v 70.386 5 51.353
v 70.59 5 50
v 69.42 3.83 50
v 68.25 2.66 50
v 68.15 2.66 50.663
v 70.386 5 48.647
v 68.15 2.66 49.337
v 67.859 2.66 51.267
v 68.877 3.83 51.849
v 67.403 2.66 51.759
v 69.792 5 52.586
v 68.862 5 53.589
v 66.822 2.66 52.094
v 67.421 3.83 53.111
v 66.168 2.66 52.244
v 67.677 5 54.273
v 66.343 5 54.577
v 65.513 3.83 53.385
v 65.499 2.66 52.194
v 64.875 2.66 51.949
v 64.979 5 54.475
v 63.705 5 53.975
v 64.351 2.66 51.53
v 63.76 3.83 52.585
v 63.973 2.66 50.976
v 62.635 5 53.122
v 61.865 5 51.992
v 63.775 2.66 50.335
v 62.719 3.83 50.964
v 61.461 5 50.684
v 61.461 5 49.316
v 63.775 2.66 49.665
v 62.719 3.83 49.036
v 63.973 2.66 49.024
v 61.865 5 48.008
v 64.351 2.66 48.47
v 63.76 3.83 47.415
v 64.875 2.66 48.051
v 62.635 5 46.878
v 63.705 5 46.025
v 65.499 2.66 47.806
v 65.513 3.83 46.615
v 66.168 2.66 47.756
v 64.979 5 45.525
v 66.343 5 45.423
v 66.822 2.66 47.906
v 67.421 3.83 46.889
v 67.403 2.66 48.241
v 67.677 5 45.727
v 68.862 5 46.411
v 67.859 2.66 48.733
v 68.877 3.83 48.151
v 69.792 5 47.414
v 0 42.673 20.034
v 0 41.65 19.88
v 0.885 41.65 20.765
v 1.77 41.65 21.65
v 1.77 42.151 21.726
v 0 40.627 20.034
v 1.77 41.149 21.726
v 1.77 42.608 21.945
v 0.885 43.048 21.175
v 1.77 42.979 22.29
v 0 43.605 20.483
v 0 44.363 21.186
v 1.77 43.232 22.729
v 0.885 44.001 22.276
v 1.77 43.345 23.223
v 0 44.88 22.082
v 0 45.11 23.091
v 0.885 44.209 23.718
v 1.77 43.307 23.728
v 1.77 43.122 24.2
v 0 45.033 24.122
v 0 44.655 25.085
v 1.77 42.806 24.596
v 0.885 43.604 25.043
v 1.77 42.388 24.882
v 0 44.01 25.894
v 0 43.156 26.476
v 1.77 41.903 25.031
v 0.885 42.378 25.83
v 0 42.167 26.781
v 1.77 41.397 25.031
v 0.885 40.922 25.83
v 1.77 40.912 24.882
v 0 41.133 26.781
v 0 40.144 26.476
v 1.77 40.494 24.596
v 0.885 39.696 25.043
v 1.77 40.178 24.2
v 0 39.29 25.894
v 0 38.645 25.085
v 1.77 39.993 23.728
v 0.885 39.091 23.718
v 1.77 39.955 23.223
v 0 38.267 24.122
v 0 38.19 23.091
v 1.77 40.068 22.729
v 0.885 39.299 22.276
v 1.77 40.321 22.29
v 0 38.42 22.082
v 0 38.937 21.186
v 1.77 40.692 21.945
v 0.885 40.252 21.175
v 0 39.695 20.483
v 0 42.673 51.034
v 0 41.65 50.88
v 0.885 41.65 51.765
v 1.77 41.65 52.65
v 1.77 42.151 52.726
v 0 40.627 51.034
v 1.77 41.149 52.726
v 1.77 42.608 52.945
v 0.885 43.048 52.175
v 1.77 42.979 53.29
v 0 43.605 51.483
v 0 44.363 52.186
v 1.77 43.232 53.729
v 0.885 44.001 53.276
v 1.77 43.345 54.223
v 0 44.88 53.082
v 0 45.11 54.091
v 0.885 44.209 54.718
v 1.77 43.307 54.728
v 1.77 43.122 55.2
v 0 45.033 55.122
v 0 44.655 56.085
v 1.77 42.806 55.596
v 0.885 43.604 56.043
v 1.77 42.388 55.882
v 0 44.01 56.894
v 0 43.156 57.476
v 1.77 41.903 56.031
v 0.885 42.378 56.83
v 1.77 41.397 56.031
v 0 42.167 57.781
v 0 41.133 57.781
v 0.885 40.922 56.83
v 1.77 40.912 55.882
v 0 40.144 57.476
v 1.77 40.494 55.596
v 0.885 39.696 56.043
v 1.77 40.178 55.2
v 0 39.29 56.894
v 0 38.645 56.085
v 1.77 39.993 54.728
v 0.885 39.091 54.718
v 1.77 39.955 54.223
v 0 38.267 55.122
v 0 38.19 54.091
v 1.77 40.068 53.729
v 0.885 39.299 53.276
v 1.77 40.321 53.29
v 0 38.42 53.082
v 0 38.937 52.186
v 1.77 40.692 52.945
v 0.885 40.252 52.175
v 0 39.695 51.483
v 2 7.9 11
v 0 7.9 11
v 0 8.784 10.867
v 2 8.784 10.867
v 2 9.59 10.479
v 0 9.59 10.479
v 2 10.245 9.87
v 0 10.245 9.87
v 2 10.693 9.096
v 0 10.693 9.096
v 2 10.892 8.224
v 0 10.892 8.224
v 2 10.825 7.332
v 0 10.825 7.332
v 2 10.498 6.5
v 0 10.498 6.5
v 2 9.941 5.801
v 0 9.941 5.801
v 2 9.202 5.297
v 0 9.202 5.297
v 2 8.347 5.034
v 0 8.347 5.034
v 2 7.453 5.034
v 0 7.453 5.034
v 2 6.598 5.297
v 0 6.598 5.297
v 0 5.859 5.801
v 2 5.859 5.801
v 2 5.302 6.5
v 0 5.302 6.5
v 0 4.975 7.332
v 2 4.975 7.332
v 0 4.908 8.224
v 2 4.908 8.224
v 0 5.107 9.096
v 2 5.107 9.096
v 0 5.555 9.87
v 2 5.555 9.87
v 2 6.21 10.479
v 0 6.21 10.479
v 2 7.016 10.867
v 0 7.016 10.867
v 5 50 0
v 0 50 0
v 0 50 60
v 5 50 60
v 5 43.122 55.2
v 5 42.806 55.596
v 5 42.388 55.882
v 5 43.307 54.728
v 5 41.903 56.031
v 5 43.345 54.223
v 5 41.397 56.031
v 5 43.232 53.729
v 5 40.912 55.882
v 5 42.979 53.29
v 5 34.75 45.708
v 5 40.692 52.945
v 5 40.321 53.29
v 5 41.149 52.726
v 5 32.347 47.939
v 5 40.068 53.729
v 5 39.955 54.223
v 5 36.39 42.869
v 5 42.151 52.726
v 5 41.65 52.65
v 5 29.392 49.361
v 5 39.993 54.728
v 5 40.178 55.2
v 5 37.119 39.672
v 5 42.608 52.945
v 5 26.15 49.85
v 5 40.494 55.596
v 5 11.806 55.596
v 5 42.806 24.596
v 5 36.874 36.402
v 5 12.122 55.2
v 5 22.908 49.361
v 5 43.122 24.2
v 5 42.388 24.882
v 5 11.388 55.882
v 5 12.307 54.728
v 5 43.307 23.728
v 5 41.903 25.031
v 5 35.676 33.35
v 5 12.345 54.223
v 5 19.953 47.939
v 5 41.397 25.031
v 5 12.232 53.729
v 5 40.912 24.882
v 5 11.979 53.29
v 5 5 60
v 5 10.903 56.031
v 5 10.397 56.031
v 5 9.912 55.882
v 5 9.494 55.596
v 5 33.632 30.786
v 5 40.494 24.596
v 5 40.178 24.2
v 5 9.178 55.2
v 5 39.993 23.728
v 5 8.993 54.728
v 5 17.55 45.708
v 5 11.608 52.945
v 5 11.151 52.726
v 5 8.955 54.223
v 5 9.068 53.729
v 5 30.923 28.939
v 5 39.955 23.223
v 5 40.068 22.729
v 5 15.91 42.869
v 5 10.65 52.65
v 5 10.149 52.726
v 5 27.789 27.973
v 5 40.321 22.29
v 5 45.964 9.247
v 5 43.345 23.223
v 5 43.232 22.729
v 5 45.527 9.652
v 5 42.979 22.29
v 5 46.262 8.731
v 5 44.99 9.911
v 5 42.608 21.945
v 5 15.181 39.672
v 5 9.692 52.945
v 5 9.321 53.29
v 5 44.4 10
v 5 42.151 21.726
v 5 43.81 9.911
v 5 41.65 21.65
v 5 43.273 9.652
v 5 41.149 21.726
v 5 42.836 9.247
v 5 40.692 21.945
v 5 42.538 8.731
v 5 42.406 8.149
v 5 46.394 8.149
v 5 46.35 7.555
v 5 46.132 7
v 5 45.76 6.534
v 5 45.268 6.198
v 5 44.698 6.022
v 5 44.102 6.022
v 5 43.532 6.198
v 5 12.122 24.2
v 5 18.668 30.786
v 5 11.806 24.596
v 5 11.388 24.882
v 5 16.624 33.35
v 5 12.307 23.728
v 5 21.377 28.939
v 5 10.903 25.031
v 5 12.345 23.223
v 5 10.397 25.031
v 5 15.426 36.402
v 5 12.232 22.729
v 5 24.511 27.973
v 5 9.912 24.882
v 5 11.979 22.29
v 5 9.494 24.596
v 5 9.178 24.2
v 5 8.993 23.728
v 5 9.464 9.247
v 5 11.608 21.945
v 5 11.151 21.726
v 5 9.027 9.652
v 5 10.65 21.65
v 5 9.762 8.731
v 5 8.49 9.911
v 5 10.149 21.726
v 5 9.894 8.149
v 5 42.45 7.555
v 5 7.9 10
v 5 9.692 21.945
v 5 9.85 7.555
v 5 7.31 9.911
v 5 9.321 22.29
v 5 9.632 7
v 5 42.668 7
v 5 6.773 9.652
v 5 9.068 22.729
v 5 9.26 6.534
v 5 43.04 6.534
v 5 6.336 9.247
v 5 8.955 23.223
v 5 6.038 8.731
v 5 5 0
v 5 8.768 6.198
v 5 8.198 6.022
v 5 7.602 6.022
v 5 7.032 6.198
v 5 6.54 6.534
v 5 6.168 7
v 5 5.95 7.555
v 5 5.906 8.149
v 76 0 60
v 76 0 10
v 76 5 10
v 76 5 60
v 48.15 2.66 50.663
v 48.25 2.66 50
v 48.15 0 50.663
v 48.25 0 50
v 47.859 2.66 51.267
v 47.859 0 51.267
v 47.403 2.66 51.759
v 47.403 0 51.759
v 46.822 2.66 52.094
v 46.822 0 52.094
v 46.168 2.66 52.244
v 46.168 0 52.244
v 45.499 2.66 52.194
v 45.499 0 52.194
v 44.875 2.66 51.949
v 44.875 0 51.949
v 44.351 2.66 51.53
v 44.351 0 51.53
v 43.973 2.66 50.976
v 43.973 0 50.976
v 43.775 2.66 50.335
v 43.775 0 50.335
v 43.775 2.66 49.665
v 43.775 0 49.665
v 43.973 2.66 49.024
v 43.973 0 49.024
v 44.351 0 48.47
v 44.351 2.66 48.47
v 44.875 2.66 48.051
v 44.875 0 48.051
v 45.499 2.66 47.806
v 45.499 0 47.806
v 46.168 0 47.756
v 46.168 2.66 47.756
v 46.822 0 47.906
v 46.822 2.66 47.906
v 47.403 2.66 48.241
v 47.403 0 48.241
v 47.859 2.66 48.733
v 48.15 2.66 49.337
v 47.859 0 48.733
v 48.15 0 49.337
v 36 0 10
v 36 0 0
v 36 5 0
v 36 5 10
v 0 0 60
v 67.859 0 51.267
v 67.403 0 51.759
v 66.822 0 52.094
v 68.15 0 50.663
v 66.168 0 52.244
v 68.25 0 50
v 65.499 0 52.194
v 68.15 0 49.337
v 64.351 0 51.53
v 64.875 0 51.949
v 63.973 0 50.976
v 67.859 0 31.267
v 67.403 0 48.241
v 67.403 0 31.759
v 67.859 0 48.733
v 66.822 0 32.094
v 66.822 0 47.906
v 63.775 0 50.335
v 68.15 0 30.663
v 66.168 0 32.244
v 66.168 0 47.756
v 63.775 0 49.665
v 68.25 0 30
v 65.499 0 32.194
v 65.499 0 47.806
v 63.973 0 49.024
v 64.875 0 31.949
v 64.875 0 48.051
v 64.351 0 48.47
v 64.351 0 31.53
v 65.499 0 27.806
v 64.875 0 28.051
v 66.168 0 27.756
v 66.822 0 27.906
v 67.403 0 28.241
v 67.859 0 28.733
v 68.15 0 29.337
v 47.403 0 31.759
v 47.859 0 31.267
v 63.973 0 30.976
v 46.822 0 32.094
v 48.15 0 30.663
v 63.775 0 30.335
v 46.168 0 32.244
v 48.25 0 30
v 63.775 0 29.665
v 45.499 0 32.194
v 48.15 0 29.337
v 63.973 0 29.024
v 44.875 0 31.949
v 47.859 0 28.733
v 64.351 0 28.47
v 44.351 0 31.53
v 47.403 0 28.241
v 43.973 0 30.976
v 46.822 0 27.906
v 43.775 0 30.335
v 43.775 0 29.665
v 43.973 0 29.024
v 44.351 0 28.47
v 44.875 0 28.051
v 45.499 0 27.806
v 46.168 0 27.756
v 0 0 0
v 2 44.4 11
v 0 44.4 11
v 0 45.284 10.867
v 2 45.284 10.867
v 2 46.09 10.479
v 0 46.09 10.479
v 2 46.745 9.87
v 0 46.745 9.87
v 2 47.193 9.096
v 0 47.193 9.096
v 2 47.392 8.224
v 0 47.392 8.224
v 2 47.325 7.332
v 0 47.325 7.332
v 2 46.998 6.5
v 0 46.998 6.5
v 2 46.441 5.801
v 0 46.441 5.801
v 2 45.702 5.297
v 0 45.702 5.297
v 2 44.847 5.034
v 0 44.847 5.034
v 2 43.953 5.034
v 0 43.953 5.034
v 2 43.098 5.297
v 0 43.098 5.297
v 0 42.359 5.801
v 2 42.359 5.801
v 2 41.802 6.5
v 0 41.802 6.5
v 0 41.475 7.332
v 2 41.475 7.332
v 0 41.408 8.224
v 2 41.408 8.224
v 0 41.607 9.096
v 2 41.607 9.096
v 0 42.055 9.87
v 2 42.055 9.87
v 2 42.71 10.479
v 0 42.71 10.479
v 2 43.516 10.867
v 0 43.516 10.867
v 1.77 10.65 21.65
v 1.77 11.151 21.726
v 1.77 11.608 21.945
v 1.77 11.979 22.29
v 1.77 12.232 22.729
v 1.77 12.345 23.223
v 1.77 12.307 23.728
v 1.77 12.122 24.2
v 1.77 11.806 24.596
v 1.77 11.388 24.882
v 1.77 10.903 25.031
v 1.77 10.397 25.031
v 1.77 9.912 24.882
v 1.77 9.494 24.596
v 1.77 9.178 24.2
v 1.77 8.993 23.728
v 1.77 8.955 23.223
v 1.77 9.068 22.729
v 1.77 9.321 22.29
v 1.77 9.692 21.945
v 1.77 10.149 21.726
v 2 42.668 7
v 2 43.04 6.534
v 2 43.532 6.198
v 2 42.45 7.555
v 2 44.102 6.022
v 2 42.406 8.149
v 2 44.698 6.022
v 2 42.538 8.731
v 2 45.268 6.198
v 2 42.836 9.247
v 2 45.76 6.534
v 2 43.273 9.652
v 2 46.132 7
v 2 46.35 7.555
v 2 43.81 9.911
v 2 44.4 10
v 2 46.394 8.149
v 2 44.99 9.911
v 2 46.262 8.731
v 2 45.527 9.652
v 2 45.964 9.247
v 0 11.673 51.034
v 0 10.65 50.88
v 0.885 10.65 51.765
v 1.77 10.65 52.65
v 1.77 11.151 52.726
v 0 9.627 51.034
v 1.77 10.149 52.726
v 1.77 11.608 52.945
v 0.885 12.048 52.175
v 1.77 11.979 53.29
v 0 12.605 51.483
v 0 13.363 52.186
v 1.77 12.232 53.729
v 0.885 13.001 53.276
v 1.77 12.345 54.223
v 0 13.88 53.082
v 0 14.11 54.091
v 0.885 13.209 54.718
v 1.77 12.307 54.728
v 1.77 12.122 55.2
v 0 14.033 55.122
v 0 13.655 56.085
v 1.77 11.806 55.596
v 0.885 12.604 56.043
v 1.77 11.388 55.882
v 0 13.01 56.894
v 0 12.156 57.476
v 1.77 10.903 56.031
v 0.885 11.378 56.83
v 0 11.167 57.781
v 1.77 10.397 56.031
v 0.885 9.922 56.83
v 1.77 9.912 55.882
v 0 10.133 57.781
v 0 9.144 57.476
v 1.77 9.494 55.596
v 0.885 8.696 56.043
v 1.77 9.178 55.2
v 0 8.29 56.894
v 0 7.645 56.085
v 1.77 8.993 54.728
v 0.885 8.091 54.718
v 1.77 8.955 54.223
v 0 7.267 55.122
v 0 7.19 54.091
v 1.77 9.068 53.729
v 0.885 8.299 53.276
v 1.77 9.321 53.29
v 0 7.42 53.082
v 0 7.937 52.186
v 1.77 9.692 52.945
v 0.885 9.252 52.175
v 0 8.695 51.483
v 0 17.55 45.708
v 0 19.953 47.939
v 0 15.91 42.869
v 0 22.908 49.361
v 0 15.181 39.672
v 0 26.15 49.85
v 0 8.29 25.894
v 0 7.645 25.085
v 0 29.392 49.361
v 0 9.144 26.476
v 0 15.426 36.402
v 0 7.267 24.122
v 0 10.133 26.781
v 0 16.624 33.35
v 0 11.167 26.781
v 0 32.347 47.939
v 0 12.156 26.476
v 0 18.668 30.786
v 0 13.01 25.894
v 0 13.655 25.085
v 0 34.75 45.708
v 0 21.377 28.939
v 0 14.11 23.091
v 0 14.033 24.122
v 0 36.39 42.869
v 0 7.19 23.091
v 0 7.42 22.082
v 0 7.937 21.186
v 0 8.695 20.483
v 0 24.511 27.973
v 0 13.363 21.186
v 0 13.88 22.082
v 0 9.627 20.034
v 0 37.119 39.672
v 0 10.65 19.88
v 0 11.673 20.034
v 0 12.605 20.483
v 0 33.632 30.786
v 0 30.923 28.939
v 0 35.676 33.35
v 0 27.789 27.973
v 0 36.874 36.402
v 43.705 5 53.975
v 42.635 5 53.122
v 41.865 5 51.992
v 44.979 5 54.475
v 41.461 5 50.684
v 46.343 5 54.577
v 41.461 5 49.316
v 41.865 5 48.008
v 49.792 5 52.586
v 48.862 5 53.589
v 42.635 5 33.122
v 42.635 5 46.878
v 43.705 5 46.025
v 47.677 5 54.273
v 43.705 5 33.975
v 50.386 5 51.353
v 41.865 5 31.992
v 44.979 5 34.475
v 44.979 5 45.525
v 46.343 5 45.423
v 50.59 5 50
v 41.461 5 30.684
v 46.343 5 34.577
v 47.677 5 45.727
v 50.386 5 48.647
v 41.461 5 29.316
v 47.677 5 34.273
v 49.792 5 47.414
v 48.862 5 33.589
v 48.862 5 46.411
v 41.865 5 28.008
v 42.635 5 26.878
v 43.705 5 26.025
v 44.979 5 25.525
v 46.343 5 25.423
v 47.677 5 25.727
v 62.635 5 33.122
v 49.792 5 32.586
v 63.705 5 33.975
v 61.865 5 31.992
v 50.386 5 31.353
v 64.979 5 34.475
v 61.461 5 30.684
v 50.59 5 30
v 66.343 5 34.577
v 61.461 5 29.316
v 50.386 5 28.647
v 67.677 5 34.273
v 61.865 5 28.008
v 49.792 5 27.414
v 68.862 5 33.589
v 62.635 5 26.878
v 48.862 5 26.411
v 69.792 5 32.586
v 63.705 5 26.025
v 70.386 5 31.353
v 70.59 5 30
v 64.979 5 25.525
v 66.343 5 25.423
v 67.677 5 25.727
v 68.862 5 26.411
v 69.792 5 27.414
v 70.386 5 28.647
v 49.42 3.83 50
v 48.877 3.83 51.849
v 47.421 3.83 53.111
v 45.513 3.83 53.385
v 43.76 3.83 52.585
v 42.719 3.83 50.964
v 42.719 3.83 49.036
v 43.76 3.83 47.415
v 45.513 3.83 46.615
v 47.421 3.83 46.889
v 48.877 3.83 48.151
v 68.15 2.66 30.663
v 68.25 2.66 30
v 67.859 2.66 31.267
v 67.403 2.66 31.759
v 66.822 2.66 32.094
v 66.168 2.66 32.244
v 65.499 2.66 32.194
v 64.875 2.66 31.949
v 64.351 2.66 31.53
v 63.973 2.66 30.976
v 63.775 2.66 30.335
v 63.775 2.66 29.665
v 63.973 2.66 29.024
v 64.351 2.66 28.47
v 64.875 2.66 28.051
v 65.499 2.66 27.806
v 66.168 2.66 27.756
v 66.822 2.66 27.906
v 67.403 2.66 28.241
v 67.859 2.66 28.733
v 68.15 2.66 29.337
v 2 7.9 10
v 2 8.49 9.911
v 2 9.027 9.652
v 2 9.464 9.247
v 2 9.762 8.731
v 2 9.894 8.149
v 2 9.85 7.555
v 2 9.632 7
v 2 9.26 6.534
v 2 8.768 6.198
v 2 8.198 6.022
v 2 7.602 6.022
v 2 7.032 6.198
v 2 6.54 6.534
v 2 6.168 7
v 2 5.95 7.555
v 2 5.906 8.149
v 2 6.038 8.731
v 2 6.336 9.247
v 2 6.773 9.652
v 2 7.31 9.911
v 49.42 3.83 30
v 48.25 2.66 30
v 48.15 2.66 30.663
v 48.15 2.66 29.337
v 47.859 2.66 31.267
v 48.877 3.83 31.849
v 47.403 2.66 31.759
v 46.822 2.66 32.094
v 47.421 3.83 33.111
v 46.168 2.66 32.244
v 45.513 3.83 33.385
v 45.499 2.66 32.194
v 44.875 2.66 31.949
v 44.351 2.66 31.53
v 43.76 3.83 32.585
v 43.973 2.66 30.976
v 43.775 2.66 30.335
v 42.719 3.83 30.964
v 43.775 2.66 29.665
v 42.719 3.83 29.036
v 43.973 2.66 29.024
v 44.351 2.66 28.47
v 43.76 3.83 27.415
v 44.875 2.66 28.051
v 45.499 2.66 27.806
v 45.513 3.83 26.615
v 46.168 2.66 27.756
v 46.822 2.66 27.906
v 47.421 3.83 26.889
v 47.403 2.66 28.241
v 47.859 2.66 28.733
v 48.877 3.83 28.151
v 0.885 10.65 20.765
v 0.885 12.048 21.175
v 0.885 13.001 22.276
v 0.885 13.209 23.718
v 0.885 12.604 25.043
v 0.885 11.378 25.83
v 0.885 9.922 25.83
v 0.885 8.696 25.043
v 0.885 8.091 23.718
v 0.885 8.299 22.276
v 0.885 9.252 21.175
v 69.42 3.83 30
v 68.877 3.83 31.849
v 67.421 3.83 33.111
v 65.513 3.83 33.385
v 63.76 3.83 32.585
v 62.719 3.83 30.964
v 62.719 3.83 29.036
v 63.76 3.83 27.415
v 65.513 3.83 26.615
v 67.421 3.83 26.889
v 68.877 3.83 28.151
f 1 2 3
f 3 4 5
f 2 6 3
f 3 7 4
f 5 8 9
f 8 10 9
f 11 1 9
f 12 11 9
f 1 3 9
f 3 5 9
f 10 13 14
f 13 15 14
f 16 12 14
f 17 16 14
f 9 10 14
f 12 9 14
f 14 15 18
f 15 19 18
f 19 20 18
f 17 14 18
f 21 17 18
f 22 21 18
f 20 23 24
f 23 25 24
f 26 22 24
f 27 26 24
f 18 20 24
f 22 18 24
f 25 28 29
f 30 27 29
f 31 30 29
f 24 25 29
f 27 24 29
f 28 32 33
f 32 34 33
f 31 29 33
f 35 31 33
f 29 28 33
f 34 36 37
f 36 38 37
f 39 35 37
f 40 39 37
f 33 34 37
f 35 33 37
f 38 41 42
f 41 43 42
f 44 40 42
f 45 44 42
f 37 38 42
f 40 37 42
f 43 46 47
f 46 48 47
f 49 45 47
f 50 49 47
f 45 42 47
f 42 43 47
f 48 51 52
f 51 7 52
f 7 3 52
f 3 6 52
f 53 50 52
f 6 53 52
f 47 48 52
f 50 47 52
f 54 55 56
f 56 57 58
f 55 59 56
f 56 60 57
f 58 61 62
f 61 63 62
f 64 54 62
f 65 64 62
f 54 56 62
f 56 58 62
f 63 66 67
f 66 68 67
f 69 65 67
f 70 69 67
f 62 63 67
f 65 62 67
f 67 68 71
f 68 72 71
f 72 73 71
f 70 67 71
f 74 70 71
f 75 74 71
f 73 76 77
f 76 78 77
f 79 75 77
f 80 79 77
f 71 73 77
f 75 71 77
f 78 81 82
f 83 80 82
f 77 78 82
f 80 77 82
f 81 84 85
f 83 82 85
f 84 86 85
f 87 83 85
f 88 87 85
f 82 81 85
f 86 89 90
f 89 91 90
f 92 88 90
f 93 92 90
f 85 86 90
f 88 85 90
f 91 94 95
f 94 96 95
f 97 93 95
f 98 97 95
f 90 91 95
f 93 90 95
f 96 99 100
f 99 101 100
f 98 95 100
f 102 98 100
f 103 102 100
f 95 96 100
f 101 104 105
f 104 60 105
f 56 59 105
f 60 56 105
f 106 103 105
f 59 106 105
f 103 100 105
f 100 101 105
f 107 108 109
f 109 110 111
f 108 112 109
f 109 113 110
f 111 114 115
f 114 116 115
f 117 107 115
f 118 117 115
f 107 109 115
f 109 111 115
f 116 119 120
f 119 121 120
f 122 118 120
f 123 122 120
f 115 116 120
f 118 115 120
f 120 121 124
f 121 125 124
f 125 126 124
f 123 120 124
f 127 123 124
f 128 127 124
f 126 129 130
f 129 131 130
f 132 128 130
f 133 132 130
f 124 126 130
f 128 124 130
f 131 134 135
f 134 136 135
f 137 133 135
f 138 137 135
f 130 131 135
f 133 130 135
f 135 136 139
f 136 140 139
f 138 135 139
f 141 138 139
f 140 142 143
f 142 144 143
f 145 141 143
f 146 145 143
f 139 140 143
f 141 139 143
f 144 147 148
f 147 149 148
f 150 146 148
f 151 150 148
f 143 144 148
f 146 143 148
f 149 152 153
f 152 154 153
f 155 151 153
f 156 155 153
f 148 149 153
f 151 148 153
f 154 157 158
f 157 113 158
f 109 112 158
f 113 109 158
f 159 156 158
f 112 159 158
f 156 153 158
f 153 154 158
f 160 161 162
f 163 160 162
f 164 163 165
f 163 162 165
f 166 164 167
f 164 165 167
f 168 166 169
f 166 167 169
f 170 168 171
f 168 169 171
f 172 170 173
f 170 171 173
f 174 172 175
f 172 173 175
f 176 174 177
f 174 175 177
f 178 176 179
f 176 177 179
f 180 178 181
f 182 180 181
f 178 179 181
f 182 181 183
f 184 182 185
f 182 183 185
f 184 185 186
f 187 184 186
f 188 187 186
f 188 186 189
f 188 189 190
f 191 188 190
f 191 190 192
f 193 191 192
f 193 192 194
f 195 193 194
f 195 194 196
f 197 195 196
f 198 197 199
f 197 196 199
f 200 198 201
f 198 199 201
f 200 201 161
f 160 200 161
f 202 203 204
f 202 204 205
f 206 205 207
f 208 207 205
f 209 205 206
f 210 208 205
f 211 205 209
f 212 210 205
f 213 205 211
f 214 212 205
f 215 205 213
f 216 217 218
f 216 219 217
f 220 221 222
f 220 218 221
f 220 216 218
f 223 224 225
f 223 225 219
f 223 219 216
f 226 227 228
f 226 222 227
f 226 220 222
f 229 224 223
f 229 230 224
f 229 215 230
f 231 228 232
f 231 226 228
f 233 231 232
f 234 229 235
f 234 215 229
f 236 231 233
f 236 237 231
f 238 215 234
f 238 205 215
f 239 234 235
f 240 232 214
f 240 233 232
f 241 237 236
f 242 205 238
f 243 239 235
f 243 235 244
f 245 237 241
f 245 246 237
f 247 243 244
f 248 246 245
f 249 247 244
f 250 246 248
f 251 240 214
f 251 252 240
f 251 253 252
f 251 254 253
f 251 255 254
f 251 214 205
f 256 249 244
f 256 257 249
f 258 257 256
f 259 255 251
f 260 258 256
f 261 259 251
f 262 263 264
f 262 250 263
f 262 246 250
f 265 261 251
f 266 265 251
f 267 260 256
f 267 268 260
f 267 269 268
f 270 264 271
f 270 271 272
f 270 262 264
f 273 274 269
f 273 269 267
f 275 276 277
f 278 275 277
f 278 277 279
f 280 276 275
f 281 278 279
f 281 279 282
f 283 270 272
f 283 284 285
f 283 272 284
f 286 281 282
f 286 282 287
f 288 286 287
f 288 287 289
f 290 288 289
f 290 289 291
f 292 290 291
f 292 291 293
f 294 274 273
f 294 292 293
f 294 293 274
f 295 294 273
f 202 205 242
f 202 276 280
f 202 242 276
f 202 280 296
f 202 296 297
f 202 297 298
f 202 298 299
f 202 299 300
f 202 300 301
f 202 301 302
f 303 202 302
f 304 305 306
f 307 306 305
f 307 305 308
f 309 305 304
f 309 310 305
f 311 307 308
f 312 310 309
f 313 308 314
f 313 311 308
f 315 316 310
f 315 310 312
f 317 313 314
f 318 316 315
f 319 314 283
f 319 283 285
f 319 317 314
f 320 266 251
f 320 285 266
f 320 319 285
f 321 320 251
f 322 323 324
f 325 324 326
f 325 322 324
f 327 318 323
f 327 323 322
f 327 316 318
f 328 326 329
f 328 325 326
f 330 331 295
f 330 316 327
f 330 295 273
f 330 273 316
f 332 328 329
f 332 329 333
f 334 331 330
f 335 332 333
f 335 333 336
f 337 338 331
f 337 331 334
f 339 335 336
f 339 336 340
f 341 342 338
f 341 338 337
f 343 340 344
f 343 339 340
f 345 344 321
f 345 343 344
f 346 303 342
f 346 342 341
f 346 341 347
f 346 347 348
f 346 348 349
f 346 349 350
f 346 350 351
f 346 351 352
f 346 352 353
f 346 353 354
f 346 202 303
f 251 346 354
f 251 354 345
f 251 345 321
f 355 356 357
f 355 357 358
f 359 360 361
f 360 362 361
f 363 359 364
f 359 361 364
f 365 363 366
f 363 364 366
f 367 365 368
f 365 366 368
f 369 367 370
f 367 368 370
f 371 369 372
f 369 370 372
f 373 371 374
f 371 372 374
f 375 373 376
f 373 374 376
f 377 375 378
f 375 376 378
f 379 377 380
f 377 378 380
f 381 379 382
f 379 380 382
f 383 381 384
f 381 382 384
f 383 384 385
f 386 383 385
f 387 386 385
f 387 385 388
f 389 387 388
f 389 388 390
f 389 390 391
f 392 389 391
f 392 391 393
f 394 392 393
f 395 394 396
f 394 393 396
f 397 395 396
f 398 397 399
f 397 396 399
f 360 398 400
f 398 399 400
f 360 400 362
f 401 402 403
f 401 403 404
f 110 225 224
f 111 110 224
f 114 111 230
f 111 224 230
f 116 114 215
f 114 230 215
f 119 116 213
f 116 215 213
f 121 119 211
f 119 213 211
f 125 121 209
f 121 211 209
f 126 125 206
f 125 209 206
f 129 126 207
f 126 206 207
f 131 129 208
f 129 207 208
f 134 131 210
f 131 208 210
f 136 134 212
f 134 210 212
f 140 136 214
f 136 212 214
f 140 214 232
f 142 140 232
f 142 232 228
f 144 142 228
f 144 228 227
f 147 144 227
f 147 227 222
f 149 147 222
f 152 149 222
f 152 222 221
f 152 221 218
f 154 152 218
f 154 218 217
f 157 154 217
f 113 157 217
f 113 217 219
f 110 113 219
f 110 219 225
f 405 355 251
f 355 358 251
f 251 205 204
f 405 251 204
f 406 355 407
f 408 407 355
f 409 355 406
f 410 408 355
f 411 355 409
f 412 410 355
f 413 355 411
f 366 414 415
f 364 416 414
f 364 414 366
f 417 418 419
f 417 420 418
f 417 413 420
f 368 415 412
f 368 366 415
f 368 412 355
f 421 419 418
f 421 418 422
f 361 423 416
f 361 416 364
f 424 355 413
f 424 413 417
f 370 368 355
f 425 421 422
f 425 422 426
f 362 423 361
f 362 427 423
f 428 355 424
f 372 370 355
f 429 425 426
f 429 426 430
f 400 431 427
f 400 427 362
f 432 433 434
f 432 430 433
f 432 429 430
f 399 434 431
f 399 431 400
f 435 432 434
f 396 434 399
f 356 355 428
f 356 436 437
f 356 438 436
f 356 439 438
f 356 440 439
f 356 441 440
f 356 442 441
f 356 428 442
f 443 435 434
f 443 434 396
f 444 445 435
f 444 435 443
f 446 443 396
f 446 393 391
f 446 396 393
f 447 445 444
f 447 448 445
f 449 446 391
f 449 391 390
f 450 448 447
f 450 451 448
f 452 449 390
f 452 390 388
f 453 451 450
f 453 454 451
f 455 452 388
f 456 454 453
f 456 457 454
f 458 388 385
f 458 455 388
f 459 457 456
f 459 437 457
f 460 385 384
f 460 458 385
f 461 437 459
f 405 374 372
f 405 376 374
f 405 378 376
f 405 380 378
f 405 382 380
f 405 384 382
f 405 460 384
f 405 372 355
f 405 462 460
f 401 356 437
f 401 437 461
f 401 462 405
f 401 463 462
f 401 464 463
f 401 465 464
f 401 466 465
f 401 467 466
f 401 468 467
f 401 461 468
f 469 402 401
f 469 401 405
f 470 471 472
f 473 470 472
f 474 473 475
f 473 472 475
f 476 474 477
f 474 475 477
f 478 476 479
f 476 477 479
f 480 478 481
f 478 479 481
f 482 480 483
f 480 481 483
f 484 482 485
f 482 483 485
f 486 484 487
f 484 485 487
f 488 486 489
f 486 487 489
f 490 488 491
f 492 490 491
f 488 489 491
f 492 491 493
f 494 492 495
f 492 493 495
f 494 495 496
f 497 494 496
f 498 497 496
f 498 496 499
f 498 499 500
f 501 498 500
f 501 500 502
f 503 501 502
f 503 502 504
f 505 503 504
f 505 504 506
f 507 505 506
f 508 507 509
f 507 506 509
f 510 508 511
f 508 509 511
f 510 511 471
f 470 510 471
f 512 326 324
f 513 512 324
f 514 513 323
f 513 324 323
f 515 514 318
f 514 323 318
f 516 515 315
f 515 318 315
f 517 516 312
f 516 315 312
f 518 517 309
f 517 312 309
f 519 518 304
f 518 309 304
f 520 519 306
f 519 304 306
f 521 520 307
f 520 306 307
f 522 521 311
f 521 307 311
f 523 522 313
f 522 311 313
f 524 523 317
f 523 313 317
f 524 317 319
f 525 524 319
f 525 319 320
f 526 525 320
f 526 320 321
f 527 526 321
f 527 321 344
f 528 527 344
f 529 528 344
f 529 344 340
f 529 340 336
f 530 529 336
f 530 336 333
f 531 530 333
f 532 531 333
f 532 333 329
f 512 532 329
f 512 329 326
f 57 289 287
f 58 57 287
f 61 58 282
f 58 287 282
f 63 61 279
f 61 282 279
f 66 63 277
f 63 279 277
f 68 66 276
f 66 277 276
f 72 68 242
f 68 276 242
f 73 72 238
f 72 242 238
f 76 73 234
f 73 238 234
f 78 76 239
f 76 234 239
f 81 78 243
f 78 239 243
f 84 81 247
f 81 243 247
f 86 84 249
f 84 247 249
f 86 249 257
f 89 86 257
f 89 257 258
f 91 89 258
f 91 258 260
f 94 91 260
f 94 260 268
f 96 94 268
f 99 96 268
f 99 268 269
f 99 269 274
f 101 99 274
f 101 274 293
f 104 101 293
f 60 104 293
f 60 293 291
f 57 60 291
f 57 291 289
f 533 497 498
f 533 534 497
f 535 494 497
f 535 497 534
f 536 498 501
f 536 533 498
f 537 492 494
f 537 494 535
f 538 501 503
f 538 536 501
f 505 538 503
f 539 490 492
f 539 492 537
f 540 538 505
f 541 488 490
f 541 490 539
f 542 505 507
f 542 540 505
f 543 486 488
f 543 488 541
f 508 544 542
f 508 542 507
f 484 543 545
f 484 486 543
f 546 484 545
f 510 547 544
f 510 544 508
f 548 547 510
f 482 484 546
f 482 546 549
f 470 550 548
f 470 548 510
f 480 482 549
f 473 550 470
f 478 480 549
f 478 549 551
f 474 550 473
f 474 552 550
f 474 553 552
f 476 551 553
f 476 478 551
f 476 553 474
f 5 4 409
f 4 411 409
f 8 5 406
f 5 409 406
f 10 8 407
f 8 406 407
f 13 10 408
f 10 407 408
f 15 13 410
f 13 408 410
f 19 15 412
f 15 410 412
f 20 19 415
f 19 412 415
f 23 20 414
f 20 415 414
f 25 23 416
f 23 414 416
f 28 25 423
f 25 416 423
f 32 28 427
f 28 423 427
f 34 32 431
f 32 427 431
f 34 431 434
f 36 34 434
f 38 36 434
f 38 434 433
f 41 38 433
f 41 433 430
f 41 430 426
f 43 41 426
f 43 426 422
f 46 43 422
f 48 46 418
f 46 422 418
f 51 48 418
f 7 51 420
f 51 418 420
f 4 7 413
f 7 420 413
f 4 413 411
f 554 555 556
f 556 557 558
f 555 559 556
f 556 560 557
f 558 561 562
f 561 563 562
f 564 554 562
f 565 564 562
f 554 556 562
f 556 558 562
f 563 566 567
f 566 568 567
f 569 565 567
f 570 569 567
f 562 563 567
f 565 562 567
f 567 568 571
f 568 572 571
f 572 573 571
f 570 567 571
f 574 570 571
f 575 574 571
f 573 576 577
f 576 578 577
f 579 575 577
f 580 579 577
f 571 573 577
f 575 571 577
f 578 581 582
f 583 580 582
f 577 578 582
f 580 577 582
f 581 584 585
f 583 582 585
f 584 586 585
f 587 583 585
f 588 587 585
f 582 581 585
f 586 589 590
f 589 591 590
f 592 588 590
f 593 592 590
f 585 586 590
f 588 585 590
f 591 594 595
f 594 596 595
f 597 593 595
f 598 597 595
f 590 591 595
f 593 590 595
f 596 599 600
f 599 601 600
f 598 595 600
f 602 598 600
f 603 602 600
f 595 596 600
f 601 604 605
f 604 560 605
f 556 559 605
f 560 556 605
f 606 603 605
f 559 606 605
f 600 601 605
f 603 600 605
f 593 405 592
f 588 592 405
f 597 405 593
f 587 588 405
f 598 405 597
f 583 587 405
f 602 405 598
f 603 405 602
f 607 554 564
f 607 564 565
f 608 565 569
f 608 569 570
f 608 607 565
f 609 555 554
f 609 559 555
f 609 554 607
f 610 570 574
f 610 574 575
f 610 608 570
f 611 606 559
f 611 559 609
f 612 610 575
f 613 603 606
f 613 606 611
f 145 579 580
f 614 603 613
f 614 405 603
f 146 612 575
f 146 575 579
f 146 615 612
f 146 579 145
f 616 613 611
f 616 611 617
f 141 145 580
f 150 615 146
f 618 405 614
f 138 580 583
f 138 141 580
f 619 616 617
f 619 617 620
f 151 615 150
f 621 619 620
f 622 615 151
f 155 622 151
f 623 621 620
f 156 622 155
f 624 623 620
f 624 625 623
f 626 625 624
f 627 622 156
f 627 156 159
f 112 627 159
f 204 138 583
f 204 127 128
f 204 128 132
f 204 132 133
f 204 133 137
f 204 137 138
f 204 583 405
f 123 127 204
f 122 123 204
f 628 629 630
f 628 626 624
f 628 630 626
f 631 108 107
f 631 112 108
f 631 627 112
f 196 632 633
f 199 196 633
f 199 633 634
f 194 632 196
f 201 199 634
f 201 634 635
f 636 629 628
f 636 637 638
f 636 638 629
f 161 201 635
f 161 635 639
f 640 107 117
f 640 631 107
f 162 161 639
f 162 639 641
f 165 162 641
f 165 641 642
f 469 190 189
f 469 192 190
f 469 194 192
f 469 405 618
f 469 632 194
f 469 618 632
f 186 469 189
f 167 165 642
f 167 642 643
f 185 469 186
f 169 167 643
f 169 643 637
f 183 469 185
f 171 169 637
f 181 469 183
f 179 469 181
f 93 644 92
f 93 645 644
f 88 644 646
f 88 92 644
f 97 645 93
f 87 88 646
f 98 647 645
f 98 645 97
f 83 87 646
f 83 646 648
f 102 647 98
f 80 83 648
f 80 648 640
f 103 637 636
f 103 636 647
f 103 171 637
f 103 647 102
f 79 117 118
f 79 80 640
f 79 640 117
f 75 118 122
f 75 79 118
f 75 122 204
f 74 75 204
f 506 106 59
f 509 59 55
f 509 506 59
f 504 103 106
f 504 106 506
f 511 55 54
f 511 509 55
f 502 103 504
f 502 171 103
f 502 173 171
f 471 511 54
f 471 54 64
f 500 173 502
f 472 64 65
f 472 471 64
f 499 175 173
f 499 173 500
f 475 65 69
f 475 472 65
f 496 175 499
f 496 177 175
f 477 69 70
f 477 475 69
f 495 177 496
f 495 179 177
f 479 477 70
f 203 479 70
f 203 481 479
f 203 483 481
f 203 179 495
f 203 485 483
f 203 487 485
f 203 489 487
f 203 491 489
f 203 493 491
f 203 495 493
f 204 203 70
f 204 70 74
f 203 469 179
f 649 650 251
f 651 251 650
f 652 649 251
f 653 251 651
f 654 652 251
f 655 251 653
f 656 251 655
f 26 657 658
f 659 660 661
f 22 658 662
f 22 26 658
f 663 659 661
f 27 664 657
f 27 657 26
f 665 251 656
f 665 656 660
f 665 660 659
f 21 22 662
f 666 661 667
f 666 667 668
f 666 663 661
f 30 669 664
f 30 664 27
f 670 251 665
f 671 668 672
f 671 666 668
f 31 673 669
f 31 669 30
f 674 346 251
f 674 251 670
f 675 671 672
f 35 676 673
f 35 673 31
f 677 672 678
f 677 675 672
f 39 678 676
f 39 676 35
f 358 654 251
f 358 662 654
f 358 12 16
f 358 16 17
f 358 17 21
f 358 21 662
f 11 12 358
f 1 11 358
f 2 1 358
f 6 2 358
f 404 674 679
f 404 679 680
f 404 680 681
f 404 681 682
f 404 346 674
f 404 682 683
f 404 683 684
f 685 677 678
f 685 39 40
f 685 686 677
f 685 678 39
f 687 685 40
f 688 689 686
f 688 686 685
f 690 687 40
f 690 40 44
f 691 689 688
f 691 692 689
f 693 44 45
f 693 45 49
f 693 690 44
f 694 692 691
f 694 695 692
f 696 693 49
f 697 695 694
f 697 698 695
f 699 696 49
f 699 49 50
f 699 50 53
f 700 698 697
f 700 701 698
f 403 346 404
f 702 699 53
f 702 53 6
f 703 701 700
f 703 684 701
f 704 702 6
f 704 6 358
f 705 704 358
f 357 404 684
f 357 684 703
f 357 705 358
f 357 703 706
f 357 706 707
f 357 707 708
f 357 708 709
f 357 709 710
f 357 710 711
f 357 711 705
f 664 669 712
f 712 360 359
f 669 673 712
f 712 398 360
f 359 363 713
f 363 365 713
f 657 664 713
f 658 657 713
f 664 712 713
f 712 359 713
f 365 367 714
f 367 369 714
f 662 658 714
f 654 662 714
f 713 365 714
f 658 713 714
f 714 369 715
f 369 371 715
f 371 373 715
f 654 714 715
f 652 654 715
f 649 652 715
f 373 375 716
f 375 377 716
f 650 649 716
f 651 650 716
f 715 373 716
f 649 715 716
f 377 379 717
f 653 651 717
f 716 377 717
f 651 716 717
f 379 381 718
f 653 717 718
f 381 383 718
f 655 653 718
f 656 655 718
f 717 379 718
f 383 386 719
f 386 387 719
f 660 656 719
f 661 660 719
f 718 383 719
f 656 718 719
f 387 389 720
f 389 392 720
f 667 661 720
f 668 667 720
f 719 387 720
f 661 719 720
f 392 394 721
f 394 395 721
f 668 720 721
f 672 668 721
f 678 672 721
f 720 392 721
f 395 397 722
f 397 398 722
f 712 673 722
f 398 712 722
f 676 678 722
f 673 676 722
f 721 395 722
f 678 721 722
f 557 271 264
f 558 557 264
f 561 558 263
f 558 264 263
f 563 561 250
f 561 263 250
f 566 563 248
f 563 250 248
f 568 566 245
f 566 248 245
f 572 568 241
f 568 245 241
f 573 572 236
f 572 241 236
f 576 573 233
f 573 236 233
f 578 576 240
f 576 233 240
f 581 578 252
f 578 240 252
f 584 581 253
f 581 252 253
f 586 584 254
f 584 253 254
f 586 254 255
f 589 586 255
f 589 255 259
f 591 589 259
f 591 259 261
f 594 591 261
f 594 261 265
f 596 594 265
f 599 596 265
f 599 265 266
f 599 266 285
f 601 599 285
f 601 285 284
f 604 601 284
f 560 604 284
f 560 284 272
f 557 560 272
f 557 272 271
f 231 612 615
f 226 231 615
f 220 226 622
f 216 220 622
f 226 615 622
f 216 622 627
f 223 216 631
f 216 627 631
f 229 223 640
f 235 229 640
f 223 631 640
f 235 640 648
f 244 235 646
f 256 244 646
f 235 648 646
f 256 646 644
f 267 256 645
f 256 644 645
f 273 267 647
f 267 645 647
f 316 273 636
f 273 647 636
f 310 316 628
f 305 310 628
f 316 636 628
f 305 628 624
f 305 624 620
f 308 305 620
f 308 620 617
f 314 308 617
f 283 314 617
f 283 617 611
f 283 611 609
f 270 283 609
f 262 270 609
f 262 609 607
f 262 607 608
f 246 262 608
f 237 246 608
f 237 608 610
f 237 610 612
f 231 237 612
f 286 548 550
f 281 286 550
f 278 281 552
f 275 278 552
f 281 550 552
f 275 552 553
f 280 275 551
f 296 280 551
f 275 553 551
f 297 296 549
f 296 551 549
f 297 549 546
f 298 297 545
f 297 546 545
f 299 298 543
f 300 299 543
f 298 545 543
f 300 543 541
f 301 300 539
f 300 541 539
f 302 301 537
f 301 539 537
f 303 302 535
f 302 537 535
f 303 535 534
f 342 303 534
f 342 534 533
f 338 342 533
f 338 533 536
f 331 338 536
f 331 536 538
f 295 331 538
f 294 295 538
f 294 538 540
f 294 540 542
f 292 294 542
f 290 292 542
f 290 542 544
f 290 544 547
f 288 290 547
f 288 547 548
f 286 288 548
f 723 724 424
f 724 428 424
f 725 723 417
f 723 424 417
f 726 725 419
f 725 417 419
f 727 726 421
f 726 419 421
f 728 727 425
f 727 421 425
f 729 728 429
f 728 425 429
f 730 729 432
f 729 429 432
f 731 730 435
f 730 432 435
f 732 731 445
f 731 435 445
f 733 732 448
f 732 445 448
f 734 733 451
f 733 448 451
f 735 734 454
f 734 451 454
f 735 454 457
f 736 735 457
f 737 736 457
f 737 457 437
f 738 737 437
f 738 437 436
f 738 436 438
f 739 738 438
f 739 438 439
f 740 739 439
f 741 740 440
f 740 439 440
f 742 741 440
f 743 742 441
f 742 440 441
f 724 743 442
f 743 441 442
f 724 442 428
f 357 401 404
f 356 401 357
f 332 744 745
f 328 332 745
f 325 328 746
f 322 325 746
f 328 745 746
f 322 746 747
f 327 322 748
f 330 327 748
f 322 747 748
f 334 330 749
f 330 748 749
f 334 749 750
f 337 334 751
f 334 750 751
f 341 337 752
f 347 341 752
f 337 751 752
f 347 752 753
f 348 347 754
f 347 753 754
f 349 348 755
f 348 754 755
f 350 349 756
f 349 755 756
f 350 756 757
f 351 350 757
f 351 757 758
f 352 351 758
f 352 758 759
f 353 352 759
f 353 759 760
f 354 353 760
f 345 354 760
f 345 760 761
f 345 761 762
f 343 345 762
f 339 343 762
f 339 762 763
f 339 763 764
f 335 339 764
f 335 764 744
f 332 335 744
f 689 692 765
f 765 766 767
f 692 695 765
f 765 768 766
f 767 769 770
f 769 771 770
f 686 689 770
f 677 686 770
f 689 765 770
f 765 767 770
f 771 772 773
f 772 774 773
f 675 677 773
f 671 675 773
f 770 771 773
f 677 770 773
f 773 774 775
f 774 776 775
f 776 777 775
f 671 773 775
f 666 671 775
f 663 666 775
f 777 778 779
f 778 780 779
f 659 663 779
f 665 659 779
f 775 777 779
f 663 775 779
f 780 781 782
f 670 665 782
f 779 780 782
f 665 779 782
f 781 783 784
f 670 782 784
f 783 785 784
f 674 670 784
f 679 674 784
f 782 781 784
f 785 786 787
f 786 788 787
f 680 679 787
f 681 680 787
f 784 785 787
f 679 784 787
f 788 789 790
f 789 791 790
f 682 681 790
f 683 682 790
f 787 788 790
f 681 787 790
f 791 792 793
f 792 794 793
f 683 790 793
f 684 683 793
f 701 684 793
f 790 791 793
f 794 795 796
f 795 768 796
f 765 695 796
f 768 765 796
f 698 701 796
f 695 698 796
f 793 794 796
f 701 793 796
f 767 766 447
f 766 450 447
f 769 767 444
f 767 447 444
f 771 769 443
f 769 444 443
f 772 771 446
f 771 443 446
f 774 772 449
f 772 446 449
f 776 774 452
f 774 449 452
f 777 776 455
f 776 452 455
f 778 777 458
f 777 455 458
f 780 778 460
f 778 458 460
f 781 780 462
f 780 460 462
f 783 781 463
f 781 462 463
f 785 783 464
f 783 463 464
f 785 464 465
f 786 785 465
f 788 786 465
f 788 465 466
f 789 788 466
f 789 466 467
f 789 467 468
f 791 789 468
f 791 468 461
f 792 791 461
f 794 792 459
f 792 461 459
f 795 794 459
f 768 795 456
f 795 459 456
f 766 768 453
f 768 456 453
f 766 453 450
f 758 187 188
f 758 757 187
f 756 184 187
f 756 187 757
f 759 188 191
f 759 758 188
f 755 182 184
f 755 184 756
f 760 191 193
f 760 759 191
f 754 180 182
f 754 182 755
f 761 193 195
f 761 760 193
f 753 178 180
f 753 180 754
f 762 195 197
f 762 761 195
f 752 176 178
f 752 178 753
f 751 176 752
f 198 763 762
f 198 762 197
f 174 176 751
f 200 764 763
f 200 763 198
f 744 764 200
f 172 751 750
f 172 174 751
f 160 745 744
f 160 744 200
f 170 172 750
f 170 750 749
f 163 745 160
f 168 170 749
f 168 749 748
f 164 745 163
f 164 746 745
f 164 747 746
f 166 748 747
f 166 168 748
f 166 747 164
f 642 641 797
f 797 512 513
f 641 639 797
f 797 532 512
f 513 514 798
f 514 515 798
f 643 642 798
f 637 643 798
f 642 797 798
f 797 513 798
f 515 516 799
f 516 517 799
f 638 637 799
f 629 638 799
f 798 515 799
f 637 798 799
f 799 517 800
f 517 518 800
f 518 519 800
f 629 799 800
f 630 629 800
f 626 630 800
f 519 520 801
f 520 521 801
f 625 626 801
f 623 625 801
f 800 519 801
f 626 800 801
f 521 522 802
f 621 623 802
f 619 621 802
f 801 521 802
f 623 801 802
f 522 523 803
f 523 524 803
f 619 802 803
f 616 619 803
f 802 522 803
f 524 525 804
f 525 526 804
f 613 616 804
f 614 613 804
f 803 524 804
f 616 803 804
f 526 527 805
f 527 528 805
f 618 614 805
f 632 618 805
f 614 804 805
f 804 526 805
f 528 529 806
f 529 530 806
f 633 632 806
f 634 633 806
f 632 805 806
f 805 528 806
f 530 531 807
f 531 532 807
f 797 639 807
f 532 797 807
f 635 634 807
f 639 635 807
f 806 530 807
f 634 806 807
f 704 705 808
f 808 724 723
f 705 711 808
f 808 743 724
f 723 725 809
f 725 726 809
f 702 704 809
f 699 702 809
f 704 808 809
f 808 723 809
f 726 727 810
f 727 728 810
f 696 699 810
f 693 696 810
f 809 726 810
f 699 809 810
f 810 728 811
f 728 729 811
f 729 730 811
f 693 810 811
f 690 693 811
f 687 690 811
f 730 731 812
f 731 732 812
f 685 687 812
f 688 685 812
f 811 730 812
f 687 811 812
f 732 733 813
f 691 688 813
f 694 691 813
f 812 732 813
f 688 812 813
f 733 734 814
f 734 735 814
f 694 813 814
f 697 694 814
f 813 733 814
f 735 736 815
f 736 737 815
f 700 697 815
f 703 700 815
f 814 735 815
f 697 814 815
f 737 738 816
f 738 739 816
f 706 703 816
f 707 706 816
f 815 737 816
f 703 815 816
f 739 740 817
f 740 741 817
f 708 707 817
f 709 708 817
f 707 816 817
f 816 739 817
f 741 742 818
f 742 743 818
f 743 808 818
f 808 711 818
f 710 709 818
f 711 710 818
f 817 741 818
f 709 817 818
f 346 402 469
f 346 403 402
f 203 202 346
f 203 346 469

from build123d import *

# Parameters (mm, degrees)
EXTRUDE_1_DEPTH             = 60
SKETCH_2_R                  = 11
CUT_EXTRUDE_1_DEPTH         = 60
CSK_1_D                     = 3.4
CSK_1_DEPTH                 = 5
CSK_1_CSINK_D               = 6.94
CSK_1_CSINK_ANGLE           = 90
SKETCH_5_W                  = 64
SKETCH_5_H                  = 10
CUT_EXTRUDE_2_DEPTH         = 127.885775404
SKETCH_6_R                  = 2
CUT_EXTRUDE_3_DEPTH         = 10
SKETCH_7_R                  = 3
CUT_EXTRUDE_4_DEPTH         = 2
SKETCH_8_W                  = 24
SKETCH_8_H                  = 50
CUT_EXTRUDE_5_DEPTH         = 127.885775404
HOLE_WIZARD_M41_D           = 4.5
HOLE_WIZARD_M41_CSINK_D     = 9.18
HOLE_WIZARD_M41_CSINK_ANGLE = 90


with BuildPart() as part:
    # Эскиз1 → Бобышка-Вытянуть1 (new body)
    with BuildSketch(Plane.XY):
        Polygon((0, 0), (0, 50), (5, 50), (5, 5), (95, 5), (95, 50), (100, 50), (100, 0), align=None)
    extrude(amount=EXTRUDE_1_DEPTH)

    # Эскиз2 → Вырез-Вытянуть1 (cut)
    with BuildSketch(Plane.ZY):
        with Locations((38.85, 26.15)):
            Circle(SKETCH_2_R)
    extrude(amount=-CUT_EXTRUDE_1_DEPTH, mode=Mode.SUBTRACT)

    # CSK размера винта с полупотайной головкой и крестообразным шлицем1
    with Locations(Plane.ZY):
        with Locations((54.35, 10.65), (54.35, 41.65), (23.35, 41.65), (23.35, 10.65)):
            CounterSinkHole(CSK_1_D / 2, CSK_1_CSINK_D / 2, depth=CSK_1_DEPTH, counter_sink_angle=CSK_1_CSINK_ANGLE)

    # Эскиз5 → Вырез-Вытянуть2 (cut, through all)
    with BuildSketch(Plane.XZ):
        with Locations((68, 5)):
            Rectangle(SKETCH_5_W, SKETCH_5_H)
    extrude(amount=-CUT_EXTRUDE_2_DEPTH, mode=Mode.SUBTRACT)

    # Эскиз6 → Вырез-Вытянуть3 (cut)
    with BuildSketch(Plane.ZY):
        with Locations((8, 44.4)):
            Circle(SKETCH_6_R)
        with Locations((8, 7.9)):
            Circle(SKETCH_6_R)
    extrude(amount=-CUT_EXTRUDE_3_DEPTH, mode=Mode.SUBTRACT)

    # Эскиз7 → Вырез-Вытянуть4 (cut)
    with BuildSketch(Plane.ZY):
        with Locations((8, 44.4)):
            Circle(SKETCH_7_R)
        with Locations((8, 7.9)):
            Circle(SKETCH_7_R)
    extrude(amount=-CUT_EXTRUDE_4_DEPTH, mode=Mode.SUBTRACT)

    # Эскиз8 → Вырез-Вытянуть5 (cut, through all)
    with BuildSketch(Plane.XZ):
        with Locations((88, 35)):
            Rectangle(SKETCH_8_W, SKETCH_8_H)
    extrude(amount=-CUT_EXTRUDE_5_DEPTH, mode=Mode.SUBTRACT)

    # Зенковка для винта с потайной головкой и внутренним шестигранником M41 (through all)
    with Locations(Plane(origin=(0, 5, 0), x_dir=(-1, 0, 0), z_dir=(0, 1, 0))):
        with Locations((-46, 30), (-66, 30), (-46, 50), (-66, 50)):
            CounterSinkHole(HOLE_WIZARD_M41_D / 2, HOLE_WIZARD_M41_CSINK_D / 2, counter_sink_angle=HOLE_WIZARD_M41_CSINK_ANGLE)


solid = part.part
